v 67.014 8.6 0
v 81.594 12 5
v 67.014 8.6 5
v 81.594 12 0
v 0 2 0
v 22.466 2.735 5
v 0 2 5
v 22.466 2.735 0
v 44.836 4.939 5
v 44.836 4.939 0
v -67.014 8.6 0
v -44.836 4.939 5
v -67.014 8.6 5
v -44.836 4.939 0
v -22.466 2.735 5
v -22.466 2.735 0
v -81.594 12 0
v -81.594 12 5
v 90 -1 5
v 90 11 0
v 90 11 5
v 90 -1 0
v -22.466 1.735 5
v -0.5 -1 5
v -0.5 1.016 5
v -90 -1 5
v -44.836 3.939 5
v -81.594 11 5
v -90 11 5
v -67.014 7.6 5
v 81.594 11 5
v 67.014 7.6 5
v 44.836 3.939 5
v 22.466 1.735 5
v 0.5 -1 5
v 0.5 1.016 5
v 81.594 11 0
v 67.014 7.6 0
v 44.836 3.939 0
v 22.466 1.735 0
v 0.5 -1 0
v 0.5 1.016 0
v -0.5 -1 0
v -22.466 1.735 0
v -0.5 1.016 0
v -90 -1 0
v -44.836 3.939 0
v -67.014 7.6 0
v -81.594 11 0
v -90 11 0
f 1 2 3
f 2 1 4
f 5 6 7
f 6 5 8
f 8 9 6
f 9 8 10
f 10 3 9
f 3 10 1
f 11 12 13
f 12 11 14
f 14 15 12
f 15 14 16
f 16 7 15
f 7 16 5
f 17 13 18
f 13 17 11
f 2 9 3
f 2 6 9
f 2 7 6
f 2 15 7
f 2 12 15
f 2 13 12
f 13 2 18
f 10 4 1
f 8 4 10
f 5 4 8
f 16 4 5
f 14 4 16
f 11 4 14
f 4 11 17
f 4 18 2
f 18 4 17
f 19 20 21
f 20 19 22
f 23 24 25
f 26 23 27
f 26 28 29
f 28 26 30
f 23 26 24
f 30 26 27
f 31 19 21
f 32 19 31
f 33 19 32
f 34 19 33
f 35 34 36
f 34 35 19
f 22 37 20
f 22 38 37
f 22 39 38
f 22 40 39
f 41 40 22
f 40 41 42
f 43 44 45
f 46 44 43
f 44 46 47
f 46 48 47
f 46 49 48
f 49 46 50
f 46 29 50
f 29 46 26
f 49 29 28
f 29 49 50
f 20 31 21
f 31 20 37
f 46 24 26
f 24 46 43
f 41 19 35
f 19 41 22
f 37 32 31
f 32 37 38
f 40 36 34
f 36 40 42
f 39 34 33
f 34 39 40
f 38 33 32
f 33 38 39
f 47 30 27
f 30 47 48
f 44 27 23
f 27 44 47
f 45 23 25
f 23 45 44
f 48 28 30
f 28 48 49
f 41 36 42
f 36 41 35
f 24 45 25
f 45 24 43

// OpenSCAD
epsilon=0.01;

slot_length=180;
slot_height=5;
slot_width=12;

curve_radius=(slot_width/2) + ((slot_length*slot_length)/(8*slot_width));

small_wall_thickness=2;
gap=1;

$fn=96;

module slot() {
  translate([-slot_length/2, 0, 0]) {
    cube([slot_length, slot_width, slot_height]);
  }
};

module cyl() {
  translate([0, curve_radius+small_wall_thickness, -epsilon]) {
    cylinder(r=curve_radius, h=slot_height+epsilon*2);
  }
}

module big_piece() {
  intersection() {
    cyl();
    slot();
  }
}

module small_piece() {
  difference () {
    slot();
    cyl();
    translate([-gap/2, -epsilon, -epsilon]) {
      cube([gap, slot_width, slot_height+epsilon*2]);
    }
  }
}

big_piece();

translate([0, -1, 0]) {
  small_piece();
}
  
